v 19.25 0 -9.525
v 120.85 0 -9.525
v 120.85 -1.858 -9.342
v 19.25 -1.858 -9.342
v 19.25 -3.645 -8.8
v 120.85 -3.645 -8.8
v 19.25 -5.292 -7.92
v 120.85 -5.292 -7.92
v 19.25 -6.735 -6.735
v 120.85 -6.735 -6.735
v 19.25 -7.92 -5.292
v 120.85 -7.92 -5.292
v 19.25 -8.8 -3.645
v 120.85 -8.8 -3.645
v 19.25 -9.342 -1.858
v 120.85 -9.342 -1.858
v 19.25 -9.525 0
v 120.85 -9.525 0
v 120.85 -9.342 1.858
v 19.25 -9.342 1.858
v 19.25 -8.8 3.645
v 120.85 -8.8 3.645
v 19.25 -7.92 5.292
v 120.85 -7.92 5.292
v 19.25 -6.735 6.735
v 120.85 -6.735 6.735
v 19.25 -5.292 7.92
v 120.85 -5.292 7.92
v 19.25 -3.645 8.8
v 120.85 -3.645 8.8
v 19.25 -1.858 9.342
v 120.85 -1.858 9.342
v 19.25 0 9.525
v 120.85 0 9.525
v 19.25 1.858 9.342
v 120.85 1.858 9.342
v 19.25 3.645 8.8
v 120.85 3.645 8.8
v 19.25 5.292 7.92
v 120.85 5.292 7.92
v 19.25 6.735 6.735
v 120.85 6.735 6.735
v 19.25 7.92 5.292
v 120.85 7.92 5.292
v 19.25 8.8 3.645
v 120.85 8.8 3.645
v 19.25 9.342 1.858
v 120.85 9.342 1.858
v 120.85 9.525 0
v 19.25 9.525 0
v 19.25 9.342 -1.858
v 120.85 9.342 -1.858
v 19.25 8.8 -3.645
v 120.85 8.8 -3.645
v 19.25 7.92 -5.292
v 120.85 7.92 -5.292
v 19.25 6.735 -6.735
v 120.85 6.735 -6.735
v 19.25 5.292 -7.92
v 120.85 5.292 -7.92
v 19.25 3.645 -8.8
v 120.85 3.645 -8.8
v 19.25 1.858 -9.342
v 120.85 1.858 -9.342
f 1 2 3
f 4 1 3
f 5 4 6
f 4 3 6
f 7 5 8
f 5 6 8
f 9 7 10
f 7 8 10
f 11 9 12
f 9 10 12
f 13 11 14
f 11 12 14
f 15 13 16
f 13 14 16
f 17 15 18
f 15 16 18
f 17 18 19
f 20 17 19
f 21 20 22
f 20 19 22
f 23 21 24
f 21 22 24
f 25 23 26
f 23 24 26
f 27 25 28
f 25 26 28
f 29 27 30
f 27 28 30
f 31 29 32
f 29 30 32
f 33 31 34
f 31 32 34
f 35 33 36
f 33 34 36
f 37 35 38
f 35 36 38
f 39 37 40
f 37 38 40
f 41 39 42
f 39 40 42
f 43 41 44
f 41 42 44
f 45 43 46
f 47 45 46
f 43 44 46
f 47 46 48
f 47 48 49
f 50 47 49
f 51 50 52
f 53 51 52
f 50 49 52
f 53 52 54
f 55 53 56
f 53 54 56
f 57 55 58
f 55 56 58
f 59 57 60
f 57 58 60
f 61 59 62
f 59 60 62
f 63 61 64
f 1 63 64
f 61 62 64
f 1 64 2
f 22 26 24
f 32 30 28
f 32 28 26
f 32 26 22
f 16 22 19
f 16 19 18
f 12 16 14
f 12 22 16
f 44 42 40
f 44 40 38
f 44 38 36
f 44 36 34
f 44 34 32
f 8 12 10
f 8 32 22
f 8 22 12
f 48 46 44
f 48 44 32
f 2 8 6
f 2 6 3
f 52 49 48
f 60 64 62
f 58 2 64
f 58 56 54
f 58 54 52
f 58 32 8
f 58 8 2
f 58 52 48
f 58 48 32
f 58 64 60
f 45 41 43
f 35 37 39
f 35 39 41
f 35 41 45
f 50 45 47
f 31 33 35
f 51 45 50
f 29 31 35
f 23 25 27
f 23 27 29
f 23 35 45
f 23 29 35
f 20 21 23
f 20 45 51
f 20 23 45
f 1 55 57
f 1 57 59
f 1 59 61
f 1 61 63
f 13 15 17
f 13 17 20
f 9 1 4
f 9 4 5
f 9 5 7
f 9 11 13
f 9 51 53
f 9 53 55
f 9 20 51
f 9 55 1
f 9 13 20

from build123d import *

# Parameters (mm, degrees)
SKETCH1_W           = 120.675
SKETCH1_H           = 1.5875
SKETCH6_R           = 7.9375
BOSS_EXTRUDE1_DEPTH = 101.6
SKETCH7_R           = 23.308025585
CUT_EXTRUDE3_DEPTH  = 19.075


with BuildPart() as part:
    # Sketch1 → Revolve1 (revolve)
    with BuildSketch(Plane(origin=(0, 0, 0), x_dir=(1, 0, 0), z_dir=(0, 1, 0))):
        with Locations((79.5875, 8.73125)):
            Rectangle(SKETCH1_W, SKETCH1_H)
    revolve(axis=Axis((157.324, 0, 0), (-1, 0, 0)))

    # Sketch6 → Boss-Extrude1 (add)
    with BuildSketch(Plane.ZY.offset(-19.25)):
        with Locations(Location((0, 0, 0), (0, 0, 180))):
            Circle(SKETCH6_R)
    extrude(amount=-BOSS_EXTRUDE1_DEPTH)

    # Sketch7 → Cut-Extrude3 (cut)
    with BuildSketch(Plane(origin=(120.85, 0, 0), x_dir=(0, 0, -1), z_dir=(1, 0, 0))):
        Circle(SKETCH7_R)
    extrude(amount=CUT_EXTRUDE3_DEPTH, mode=Mode.SUBTRACT)


solid = part.part
